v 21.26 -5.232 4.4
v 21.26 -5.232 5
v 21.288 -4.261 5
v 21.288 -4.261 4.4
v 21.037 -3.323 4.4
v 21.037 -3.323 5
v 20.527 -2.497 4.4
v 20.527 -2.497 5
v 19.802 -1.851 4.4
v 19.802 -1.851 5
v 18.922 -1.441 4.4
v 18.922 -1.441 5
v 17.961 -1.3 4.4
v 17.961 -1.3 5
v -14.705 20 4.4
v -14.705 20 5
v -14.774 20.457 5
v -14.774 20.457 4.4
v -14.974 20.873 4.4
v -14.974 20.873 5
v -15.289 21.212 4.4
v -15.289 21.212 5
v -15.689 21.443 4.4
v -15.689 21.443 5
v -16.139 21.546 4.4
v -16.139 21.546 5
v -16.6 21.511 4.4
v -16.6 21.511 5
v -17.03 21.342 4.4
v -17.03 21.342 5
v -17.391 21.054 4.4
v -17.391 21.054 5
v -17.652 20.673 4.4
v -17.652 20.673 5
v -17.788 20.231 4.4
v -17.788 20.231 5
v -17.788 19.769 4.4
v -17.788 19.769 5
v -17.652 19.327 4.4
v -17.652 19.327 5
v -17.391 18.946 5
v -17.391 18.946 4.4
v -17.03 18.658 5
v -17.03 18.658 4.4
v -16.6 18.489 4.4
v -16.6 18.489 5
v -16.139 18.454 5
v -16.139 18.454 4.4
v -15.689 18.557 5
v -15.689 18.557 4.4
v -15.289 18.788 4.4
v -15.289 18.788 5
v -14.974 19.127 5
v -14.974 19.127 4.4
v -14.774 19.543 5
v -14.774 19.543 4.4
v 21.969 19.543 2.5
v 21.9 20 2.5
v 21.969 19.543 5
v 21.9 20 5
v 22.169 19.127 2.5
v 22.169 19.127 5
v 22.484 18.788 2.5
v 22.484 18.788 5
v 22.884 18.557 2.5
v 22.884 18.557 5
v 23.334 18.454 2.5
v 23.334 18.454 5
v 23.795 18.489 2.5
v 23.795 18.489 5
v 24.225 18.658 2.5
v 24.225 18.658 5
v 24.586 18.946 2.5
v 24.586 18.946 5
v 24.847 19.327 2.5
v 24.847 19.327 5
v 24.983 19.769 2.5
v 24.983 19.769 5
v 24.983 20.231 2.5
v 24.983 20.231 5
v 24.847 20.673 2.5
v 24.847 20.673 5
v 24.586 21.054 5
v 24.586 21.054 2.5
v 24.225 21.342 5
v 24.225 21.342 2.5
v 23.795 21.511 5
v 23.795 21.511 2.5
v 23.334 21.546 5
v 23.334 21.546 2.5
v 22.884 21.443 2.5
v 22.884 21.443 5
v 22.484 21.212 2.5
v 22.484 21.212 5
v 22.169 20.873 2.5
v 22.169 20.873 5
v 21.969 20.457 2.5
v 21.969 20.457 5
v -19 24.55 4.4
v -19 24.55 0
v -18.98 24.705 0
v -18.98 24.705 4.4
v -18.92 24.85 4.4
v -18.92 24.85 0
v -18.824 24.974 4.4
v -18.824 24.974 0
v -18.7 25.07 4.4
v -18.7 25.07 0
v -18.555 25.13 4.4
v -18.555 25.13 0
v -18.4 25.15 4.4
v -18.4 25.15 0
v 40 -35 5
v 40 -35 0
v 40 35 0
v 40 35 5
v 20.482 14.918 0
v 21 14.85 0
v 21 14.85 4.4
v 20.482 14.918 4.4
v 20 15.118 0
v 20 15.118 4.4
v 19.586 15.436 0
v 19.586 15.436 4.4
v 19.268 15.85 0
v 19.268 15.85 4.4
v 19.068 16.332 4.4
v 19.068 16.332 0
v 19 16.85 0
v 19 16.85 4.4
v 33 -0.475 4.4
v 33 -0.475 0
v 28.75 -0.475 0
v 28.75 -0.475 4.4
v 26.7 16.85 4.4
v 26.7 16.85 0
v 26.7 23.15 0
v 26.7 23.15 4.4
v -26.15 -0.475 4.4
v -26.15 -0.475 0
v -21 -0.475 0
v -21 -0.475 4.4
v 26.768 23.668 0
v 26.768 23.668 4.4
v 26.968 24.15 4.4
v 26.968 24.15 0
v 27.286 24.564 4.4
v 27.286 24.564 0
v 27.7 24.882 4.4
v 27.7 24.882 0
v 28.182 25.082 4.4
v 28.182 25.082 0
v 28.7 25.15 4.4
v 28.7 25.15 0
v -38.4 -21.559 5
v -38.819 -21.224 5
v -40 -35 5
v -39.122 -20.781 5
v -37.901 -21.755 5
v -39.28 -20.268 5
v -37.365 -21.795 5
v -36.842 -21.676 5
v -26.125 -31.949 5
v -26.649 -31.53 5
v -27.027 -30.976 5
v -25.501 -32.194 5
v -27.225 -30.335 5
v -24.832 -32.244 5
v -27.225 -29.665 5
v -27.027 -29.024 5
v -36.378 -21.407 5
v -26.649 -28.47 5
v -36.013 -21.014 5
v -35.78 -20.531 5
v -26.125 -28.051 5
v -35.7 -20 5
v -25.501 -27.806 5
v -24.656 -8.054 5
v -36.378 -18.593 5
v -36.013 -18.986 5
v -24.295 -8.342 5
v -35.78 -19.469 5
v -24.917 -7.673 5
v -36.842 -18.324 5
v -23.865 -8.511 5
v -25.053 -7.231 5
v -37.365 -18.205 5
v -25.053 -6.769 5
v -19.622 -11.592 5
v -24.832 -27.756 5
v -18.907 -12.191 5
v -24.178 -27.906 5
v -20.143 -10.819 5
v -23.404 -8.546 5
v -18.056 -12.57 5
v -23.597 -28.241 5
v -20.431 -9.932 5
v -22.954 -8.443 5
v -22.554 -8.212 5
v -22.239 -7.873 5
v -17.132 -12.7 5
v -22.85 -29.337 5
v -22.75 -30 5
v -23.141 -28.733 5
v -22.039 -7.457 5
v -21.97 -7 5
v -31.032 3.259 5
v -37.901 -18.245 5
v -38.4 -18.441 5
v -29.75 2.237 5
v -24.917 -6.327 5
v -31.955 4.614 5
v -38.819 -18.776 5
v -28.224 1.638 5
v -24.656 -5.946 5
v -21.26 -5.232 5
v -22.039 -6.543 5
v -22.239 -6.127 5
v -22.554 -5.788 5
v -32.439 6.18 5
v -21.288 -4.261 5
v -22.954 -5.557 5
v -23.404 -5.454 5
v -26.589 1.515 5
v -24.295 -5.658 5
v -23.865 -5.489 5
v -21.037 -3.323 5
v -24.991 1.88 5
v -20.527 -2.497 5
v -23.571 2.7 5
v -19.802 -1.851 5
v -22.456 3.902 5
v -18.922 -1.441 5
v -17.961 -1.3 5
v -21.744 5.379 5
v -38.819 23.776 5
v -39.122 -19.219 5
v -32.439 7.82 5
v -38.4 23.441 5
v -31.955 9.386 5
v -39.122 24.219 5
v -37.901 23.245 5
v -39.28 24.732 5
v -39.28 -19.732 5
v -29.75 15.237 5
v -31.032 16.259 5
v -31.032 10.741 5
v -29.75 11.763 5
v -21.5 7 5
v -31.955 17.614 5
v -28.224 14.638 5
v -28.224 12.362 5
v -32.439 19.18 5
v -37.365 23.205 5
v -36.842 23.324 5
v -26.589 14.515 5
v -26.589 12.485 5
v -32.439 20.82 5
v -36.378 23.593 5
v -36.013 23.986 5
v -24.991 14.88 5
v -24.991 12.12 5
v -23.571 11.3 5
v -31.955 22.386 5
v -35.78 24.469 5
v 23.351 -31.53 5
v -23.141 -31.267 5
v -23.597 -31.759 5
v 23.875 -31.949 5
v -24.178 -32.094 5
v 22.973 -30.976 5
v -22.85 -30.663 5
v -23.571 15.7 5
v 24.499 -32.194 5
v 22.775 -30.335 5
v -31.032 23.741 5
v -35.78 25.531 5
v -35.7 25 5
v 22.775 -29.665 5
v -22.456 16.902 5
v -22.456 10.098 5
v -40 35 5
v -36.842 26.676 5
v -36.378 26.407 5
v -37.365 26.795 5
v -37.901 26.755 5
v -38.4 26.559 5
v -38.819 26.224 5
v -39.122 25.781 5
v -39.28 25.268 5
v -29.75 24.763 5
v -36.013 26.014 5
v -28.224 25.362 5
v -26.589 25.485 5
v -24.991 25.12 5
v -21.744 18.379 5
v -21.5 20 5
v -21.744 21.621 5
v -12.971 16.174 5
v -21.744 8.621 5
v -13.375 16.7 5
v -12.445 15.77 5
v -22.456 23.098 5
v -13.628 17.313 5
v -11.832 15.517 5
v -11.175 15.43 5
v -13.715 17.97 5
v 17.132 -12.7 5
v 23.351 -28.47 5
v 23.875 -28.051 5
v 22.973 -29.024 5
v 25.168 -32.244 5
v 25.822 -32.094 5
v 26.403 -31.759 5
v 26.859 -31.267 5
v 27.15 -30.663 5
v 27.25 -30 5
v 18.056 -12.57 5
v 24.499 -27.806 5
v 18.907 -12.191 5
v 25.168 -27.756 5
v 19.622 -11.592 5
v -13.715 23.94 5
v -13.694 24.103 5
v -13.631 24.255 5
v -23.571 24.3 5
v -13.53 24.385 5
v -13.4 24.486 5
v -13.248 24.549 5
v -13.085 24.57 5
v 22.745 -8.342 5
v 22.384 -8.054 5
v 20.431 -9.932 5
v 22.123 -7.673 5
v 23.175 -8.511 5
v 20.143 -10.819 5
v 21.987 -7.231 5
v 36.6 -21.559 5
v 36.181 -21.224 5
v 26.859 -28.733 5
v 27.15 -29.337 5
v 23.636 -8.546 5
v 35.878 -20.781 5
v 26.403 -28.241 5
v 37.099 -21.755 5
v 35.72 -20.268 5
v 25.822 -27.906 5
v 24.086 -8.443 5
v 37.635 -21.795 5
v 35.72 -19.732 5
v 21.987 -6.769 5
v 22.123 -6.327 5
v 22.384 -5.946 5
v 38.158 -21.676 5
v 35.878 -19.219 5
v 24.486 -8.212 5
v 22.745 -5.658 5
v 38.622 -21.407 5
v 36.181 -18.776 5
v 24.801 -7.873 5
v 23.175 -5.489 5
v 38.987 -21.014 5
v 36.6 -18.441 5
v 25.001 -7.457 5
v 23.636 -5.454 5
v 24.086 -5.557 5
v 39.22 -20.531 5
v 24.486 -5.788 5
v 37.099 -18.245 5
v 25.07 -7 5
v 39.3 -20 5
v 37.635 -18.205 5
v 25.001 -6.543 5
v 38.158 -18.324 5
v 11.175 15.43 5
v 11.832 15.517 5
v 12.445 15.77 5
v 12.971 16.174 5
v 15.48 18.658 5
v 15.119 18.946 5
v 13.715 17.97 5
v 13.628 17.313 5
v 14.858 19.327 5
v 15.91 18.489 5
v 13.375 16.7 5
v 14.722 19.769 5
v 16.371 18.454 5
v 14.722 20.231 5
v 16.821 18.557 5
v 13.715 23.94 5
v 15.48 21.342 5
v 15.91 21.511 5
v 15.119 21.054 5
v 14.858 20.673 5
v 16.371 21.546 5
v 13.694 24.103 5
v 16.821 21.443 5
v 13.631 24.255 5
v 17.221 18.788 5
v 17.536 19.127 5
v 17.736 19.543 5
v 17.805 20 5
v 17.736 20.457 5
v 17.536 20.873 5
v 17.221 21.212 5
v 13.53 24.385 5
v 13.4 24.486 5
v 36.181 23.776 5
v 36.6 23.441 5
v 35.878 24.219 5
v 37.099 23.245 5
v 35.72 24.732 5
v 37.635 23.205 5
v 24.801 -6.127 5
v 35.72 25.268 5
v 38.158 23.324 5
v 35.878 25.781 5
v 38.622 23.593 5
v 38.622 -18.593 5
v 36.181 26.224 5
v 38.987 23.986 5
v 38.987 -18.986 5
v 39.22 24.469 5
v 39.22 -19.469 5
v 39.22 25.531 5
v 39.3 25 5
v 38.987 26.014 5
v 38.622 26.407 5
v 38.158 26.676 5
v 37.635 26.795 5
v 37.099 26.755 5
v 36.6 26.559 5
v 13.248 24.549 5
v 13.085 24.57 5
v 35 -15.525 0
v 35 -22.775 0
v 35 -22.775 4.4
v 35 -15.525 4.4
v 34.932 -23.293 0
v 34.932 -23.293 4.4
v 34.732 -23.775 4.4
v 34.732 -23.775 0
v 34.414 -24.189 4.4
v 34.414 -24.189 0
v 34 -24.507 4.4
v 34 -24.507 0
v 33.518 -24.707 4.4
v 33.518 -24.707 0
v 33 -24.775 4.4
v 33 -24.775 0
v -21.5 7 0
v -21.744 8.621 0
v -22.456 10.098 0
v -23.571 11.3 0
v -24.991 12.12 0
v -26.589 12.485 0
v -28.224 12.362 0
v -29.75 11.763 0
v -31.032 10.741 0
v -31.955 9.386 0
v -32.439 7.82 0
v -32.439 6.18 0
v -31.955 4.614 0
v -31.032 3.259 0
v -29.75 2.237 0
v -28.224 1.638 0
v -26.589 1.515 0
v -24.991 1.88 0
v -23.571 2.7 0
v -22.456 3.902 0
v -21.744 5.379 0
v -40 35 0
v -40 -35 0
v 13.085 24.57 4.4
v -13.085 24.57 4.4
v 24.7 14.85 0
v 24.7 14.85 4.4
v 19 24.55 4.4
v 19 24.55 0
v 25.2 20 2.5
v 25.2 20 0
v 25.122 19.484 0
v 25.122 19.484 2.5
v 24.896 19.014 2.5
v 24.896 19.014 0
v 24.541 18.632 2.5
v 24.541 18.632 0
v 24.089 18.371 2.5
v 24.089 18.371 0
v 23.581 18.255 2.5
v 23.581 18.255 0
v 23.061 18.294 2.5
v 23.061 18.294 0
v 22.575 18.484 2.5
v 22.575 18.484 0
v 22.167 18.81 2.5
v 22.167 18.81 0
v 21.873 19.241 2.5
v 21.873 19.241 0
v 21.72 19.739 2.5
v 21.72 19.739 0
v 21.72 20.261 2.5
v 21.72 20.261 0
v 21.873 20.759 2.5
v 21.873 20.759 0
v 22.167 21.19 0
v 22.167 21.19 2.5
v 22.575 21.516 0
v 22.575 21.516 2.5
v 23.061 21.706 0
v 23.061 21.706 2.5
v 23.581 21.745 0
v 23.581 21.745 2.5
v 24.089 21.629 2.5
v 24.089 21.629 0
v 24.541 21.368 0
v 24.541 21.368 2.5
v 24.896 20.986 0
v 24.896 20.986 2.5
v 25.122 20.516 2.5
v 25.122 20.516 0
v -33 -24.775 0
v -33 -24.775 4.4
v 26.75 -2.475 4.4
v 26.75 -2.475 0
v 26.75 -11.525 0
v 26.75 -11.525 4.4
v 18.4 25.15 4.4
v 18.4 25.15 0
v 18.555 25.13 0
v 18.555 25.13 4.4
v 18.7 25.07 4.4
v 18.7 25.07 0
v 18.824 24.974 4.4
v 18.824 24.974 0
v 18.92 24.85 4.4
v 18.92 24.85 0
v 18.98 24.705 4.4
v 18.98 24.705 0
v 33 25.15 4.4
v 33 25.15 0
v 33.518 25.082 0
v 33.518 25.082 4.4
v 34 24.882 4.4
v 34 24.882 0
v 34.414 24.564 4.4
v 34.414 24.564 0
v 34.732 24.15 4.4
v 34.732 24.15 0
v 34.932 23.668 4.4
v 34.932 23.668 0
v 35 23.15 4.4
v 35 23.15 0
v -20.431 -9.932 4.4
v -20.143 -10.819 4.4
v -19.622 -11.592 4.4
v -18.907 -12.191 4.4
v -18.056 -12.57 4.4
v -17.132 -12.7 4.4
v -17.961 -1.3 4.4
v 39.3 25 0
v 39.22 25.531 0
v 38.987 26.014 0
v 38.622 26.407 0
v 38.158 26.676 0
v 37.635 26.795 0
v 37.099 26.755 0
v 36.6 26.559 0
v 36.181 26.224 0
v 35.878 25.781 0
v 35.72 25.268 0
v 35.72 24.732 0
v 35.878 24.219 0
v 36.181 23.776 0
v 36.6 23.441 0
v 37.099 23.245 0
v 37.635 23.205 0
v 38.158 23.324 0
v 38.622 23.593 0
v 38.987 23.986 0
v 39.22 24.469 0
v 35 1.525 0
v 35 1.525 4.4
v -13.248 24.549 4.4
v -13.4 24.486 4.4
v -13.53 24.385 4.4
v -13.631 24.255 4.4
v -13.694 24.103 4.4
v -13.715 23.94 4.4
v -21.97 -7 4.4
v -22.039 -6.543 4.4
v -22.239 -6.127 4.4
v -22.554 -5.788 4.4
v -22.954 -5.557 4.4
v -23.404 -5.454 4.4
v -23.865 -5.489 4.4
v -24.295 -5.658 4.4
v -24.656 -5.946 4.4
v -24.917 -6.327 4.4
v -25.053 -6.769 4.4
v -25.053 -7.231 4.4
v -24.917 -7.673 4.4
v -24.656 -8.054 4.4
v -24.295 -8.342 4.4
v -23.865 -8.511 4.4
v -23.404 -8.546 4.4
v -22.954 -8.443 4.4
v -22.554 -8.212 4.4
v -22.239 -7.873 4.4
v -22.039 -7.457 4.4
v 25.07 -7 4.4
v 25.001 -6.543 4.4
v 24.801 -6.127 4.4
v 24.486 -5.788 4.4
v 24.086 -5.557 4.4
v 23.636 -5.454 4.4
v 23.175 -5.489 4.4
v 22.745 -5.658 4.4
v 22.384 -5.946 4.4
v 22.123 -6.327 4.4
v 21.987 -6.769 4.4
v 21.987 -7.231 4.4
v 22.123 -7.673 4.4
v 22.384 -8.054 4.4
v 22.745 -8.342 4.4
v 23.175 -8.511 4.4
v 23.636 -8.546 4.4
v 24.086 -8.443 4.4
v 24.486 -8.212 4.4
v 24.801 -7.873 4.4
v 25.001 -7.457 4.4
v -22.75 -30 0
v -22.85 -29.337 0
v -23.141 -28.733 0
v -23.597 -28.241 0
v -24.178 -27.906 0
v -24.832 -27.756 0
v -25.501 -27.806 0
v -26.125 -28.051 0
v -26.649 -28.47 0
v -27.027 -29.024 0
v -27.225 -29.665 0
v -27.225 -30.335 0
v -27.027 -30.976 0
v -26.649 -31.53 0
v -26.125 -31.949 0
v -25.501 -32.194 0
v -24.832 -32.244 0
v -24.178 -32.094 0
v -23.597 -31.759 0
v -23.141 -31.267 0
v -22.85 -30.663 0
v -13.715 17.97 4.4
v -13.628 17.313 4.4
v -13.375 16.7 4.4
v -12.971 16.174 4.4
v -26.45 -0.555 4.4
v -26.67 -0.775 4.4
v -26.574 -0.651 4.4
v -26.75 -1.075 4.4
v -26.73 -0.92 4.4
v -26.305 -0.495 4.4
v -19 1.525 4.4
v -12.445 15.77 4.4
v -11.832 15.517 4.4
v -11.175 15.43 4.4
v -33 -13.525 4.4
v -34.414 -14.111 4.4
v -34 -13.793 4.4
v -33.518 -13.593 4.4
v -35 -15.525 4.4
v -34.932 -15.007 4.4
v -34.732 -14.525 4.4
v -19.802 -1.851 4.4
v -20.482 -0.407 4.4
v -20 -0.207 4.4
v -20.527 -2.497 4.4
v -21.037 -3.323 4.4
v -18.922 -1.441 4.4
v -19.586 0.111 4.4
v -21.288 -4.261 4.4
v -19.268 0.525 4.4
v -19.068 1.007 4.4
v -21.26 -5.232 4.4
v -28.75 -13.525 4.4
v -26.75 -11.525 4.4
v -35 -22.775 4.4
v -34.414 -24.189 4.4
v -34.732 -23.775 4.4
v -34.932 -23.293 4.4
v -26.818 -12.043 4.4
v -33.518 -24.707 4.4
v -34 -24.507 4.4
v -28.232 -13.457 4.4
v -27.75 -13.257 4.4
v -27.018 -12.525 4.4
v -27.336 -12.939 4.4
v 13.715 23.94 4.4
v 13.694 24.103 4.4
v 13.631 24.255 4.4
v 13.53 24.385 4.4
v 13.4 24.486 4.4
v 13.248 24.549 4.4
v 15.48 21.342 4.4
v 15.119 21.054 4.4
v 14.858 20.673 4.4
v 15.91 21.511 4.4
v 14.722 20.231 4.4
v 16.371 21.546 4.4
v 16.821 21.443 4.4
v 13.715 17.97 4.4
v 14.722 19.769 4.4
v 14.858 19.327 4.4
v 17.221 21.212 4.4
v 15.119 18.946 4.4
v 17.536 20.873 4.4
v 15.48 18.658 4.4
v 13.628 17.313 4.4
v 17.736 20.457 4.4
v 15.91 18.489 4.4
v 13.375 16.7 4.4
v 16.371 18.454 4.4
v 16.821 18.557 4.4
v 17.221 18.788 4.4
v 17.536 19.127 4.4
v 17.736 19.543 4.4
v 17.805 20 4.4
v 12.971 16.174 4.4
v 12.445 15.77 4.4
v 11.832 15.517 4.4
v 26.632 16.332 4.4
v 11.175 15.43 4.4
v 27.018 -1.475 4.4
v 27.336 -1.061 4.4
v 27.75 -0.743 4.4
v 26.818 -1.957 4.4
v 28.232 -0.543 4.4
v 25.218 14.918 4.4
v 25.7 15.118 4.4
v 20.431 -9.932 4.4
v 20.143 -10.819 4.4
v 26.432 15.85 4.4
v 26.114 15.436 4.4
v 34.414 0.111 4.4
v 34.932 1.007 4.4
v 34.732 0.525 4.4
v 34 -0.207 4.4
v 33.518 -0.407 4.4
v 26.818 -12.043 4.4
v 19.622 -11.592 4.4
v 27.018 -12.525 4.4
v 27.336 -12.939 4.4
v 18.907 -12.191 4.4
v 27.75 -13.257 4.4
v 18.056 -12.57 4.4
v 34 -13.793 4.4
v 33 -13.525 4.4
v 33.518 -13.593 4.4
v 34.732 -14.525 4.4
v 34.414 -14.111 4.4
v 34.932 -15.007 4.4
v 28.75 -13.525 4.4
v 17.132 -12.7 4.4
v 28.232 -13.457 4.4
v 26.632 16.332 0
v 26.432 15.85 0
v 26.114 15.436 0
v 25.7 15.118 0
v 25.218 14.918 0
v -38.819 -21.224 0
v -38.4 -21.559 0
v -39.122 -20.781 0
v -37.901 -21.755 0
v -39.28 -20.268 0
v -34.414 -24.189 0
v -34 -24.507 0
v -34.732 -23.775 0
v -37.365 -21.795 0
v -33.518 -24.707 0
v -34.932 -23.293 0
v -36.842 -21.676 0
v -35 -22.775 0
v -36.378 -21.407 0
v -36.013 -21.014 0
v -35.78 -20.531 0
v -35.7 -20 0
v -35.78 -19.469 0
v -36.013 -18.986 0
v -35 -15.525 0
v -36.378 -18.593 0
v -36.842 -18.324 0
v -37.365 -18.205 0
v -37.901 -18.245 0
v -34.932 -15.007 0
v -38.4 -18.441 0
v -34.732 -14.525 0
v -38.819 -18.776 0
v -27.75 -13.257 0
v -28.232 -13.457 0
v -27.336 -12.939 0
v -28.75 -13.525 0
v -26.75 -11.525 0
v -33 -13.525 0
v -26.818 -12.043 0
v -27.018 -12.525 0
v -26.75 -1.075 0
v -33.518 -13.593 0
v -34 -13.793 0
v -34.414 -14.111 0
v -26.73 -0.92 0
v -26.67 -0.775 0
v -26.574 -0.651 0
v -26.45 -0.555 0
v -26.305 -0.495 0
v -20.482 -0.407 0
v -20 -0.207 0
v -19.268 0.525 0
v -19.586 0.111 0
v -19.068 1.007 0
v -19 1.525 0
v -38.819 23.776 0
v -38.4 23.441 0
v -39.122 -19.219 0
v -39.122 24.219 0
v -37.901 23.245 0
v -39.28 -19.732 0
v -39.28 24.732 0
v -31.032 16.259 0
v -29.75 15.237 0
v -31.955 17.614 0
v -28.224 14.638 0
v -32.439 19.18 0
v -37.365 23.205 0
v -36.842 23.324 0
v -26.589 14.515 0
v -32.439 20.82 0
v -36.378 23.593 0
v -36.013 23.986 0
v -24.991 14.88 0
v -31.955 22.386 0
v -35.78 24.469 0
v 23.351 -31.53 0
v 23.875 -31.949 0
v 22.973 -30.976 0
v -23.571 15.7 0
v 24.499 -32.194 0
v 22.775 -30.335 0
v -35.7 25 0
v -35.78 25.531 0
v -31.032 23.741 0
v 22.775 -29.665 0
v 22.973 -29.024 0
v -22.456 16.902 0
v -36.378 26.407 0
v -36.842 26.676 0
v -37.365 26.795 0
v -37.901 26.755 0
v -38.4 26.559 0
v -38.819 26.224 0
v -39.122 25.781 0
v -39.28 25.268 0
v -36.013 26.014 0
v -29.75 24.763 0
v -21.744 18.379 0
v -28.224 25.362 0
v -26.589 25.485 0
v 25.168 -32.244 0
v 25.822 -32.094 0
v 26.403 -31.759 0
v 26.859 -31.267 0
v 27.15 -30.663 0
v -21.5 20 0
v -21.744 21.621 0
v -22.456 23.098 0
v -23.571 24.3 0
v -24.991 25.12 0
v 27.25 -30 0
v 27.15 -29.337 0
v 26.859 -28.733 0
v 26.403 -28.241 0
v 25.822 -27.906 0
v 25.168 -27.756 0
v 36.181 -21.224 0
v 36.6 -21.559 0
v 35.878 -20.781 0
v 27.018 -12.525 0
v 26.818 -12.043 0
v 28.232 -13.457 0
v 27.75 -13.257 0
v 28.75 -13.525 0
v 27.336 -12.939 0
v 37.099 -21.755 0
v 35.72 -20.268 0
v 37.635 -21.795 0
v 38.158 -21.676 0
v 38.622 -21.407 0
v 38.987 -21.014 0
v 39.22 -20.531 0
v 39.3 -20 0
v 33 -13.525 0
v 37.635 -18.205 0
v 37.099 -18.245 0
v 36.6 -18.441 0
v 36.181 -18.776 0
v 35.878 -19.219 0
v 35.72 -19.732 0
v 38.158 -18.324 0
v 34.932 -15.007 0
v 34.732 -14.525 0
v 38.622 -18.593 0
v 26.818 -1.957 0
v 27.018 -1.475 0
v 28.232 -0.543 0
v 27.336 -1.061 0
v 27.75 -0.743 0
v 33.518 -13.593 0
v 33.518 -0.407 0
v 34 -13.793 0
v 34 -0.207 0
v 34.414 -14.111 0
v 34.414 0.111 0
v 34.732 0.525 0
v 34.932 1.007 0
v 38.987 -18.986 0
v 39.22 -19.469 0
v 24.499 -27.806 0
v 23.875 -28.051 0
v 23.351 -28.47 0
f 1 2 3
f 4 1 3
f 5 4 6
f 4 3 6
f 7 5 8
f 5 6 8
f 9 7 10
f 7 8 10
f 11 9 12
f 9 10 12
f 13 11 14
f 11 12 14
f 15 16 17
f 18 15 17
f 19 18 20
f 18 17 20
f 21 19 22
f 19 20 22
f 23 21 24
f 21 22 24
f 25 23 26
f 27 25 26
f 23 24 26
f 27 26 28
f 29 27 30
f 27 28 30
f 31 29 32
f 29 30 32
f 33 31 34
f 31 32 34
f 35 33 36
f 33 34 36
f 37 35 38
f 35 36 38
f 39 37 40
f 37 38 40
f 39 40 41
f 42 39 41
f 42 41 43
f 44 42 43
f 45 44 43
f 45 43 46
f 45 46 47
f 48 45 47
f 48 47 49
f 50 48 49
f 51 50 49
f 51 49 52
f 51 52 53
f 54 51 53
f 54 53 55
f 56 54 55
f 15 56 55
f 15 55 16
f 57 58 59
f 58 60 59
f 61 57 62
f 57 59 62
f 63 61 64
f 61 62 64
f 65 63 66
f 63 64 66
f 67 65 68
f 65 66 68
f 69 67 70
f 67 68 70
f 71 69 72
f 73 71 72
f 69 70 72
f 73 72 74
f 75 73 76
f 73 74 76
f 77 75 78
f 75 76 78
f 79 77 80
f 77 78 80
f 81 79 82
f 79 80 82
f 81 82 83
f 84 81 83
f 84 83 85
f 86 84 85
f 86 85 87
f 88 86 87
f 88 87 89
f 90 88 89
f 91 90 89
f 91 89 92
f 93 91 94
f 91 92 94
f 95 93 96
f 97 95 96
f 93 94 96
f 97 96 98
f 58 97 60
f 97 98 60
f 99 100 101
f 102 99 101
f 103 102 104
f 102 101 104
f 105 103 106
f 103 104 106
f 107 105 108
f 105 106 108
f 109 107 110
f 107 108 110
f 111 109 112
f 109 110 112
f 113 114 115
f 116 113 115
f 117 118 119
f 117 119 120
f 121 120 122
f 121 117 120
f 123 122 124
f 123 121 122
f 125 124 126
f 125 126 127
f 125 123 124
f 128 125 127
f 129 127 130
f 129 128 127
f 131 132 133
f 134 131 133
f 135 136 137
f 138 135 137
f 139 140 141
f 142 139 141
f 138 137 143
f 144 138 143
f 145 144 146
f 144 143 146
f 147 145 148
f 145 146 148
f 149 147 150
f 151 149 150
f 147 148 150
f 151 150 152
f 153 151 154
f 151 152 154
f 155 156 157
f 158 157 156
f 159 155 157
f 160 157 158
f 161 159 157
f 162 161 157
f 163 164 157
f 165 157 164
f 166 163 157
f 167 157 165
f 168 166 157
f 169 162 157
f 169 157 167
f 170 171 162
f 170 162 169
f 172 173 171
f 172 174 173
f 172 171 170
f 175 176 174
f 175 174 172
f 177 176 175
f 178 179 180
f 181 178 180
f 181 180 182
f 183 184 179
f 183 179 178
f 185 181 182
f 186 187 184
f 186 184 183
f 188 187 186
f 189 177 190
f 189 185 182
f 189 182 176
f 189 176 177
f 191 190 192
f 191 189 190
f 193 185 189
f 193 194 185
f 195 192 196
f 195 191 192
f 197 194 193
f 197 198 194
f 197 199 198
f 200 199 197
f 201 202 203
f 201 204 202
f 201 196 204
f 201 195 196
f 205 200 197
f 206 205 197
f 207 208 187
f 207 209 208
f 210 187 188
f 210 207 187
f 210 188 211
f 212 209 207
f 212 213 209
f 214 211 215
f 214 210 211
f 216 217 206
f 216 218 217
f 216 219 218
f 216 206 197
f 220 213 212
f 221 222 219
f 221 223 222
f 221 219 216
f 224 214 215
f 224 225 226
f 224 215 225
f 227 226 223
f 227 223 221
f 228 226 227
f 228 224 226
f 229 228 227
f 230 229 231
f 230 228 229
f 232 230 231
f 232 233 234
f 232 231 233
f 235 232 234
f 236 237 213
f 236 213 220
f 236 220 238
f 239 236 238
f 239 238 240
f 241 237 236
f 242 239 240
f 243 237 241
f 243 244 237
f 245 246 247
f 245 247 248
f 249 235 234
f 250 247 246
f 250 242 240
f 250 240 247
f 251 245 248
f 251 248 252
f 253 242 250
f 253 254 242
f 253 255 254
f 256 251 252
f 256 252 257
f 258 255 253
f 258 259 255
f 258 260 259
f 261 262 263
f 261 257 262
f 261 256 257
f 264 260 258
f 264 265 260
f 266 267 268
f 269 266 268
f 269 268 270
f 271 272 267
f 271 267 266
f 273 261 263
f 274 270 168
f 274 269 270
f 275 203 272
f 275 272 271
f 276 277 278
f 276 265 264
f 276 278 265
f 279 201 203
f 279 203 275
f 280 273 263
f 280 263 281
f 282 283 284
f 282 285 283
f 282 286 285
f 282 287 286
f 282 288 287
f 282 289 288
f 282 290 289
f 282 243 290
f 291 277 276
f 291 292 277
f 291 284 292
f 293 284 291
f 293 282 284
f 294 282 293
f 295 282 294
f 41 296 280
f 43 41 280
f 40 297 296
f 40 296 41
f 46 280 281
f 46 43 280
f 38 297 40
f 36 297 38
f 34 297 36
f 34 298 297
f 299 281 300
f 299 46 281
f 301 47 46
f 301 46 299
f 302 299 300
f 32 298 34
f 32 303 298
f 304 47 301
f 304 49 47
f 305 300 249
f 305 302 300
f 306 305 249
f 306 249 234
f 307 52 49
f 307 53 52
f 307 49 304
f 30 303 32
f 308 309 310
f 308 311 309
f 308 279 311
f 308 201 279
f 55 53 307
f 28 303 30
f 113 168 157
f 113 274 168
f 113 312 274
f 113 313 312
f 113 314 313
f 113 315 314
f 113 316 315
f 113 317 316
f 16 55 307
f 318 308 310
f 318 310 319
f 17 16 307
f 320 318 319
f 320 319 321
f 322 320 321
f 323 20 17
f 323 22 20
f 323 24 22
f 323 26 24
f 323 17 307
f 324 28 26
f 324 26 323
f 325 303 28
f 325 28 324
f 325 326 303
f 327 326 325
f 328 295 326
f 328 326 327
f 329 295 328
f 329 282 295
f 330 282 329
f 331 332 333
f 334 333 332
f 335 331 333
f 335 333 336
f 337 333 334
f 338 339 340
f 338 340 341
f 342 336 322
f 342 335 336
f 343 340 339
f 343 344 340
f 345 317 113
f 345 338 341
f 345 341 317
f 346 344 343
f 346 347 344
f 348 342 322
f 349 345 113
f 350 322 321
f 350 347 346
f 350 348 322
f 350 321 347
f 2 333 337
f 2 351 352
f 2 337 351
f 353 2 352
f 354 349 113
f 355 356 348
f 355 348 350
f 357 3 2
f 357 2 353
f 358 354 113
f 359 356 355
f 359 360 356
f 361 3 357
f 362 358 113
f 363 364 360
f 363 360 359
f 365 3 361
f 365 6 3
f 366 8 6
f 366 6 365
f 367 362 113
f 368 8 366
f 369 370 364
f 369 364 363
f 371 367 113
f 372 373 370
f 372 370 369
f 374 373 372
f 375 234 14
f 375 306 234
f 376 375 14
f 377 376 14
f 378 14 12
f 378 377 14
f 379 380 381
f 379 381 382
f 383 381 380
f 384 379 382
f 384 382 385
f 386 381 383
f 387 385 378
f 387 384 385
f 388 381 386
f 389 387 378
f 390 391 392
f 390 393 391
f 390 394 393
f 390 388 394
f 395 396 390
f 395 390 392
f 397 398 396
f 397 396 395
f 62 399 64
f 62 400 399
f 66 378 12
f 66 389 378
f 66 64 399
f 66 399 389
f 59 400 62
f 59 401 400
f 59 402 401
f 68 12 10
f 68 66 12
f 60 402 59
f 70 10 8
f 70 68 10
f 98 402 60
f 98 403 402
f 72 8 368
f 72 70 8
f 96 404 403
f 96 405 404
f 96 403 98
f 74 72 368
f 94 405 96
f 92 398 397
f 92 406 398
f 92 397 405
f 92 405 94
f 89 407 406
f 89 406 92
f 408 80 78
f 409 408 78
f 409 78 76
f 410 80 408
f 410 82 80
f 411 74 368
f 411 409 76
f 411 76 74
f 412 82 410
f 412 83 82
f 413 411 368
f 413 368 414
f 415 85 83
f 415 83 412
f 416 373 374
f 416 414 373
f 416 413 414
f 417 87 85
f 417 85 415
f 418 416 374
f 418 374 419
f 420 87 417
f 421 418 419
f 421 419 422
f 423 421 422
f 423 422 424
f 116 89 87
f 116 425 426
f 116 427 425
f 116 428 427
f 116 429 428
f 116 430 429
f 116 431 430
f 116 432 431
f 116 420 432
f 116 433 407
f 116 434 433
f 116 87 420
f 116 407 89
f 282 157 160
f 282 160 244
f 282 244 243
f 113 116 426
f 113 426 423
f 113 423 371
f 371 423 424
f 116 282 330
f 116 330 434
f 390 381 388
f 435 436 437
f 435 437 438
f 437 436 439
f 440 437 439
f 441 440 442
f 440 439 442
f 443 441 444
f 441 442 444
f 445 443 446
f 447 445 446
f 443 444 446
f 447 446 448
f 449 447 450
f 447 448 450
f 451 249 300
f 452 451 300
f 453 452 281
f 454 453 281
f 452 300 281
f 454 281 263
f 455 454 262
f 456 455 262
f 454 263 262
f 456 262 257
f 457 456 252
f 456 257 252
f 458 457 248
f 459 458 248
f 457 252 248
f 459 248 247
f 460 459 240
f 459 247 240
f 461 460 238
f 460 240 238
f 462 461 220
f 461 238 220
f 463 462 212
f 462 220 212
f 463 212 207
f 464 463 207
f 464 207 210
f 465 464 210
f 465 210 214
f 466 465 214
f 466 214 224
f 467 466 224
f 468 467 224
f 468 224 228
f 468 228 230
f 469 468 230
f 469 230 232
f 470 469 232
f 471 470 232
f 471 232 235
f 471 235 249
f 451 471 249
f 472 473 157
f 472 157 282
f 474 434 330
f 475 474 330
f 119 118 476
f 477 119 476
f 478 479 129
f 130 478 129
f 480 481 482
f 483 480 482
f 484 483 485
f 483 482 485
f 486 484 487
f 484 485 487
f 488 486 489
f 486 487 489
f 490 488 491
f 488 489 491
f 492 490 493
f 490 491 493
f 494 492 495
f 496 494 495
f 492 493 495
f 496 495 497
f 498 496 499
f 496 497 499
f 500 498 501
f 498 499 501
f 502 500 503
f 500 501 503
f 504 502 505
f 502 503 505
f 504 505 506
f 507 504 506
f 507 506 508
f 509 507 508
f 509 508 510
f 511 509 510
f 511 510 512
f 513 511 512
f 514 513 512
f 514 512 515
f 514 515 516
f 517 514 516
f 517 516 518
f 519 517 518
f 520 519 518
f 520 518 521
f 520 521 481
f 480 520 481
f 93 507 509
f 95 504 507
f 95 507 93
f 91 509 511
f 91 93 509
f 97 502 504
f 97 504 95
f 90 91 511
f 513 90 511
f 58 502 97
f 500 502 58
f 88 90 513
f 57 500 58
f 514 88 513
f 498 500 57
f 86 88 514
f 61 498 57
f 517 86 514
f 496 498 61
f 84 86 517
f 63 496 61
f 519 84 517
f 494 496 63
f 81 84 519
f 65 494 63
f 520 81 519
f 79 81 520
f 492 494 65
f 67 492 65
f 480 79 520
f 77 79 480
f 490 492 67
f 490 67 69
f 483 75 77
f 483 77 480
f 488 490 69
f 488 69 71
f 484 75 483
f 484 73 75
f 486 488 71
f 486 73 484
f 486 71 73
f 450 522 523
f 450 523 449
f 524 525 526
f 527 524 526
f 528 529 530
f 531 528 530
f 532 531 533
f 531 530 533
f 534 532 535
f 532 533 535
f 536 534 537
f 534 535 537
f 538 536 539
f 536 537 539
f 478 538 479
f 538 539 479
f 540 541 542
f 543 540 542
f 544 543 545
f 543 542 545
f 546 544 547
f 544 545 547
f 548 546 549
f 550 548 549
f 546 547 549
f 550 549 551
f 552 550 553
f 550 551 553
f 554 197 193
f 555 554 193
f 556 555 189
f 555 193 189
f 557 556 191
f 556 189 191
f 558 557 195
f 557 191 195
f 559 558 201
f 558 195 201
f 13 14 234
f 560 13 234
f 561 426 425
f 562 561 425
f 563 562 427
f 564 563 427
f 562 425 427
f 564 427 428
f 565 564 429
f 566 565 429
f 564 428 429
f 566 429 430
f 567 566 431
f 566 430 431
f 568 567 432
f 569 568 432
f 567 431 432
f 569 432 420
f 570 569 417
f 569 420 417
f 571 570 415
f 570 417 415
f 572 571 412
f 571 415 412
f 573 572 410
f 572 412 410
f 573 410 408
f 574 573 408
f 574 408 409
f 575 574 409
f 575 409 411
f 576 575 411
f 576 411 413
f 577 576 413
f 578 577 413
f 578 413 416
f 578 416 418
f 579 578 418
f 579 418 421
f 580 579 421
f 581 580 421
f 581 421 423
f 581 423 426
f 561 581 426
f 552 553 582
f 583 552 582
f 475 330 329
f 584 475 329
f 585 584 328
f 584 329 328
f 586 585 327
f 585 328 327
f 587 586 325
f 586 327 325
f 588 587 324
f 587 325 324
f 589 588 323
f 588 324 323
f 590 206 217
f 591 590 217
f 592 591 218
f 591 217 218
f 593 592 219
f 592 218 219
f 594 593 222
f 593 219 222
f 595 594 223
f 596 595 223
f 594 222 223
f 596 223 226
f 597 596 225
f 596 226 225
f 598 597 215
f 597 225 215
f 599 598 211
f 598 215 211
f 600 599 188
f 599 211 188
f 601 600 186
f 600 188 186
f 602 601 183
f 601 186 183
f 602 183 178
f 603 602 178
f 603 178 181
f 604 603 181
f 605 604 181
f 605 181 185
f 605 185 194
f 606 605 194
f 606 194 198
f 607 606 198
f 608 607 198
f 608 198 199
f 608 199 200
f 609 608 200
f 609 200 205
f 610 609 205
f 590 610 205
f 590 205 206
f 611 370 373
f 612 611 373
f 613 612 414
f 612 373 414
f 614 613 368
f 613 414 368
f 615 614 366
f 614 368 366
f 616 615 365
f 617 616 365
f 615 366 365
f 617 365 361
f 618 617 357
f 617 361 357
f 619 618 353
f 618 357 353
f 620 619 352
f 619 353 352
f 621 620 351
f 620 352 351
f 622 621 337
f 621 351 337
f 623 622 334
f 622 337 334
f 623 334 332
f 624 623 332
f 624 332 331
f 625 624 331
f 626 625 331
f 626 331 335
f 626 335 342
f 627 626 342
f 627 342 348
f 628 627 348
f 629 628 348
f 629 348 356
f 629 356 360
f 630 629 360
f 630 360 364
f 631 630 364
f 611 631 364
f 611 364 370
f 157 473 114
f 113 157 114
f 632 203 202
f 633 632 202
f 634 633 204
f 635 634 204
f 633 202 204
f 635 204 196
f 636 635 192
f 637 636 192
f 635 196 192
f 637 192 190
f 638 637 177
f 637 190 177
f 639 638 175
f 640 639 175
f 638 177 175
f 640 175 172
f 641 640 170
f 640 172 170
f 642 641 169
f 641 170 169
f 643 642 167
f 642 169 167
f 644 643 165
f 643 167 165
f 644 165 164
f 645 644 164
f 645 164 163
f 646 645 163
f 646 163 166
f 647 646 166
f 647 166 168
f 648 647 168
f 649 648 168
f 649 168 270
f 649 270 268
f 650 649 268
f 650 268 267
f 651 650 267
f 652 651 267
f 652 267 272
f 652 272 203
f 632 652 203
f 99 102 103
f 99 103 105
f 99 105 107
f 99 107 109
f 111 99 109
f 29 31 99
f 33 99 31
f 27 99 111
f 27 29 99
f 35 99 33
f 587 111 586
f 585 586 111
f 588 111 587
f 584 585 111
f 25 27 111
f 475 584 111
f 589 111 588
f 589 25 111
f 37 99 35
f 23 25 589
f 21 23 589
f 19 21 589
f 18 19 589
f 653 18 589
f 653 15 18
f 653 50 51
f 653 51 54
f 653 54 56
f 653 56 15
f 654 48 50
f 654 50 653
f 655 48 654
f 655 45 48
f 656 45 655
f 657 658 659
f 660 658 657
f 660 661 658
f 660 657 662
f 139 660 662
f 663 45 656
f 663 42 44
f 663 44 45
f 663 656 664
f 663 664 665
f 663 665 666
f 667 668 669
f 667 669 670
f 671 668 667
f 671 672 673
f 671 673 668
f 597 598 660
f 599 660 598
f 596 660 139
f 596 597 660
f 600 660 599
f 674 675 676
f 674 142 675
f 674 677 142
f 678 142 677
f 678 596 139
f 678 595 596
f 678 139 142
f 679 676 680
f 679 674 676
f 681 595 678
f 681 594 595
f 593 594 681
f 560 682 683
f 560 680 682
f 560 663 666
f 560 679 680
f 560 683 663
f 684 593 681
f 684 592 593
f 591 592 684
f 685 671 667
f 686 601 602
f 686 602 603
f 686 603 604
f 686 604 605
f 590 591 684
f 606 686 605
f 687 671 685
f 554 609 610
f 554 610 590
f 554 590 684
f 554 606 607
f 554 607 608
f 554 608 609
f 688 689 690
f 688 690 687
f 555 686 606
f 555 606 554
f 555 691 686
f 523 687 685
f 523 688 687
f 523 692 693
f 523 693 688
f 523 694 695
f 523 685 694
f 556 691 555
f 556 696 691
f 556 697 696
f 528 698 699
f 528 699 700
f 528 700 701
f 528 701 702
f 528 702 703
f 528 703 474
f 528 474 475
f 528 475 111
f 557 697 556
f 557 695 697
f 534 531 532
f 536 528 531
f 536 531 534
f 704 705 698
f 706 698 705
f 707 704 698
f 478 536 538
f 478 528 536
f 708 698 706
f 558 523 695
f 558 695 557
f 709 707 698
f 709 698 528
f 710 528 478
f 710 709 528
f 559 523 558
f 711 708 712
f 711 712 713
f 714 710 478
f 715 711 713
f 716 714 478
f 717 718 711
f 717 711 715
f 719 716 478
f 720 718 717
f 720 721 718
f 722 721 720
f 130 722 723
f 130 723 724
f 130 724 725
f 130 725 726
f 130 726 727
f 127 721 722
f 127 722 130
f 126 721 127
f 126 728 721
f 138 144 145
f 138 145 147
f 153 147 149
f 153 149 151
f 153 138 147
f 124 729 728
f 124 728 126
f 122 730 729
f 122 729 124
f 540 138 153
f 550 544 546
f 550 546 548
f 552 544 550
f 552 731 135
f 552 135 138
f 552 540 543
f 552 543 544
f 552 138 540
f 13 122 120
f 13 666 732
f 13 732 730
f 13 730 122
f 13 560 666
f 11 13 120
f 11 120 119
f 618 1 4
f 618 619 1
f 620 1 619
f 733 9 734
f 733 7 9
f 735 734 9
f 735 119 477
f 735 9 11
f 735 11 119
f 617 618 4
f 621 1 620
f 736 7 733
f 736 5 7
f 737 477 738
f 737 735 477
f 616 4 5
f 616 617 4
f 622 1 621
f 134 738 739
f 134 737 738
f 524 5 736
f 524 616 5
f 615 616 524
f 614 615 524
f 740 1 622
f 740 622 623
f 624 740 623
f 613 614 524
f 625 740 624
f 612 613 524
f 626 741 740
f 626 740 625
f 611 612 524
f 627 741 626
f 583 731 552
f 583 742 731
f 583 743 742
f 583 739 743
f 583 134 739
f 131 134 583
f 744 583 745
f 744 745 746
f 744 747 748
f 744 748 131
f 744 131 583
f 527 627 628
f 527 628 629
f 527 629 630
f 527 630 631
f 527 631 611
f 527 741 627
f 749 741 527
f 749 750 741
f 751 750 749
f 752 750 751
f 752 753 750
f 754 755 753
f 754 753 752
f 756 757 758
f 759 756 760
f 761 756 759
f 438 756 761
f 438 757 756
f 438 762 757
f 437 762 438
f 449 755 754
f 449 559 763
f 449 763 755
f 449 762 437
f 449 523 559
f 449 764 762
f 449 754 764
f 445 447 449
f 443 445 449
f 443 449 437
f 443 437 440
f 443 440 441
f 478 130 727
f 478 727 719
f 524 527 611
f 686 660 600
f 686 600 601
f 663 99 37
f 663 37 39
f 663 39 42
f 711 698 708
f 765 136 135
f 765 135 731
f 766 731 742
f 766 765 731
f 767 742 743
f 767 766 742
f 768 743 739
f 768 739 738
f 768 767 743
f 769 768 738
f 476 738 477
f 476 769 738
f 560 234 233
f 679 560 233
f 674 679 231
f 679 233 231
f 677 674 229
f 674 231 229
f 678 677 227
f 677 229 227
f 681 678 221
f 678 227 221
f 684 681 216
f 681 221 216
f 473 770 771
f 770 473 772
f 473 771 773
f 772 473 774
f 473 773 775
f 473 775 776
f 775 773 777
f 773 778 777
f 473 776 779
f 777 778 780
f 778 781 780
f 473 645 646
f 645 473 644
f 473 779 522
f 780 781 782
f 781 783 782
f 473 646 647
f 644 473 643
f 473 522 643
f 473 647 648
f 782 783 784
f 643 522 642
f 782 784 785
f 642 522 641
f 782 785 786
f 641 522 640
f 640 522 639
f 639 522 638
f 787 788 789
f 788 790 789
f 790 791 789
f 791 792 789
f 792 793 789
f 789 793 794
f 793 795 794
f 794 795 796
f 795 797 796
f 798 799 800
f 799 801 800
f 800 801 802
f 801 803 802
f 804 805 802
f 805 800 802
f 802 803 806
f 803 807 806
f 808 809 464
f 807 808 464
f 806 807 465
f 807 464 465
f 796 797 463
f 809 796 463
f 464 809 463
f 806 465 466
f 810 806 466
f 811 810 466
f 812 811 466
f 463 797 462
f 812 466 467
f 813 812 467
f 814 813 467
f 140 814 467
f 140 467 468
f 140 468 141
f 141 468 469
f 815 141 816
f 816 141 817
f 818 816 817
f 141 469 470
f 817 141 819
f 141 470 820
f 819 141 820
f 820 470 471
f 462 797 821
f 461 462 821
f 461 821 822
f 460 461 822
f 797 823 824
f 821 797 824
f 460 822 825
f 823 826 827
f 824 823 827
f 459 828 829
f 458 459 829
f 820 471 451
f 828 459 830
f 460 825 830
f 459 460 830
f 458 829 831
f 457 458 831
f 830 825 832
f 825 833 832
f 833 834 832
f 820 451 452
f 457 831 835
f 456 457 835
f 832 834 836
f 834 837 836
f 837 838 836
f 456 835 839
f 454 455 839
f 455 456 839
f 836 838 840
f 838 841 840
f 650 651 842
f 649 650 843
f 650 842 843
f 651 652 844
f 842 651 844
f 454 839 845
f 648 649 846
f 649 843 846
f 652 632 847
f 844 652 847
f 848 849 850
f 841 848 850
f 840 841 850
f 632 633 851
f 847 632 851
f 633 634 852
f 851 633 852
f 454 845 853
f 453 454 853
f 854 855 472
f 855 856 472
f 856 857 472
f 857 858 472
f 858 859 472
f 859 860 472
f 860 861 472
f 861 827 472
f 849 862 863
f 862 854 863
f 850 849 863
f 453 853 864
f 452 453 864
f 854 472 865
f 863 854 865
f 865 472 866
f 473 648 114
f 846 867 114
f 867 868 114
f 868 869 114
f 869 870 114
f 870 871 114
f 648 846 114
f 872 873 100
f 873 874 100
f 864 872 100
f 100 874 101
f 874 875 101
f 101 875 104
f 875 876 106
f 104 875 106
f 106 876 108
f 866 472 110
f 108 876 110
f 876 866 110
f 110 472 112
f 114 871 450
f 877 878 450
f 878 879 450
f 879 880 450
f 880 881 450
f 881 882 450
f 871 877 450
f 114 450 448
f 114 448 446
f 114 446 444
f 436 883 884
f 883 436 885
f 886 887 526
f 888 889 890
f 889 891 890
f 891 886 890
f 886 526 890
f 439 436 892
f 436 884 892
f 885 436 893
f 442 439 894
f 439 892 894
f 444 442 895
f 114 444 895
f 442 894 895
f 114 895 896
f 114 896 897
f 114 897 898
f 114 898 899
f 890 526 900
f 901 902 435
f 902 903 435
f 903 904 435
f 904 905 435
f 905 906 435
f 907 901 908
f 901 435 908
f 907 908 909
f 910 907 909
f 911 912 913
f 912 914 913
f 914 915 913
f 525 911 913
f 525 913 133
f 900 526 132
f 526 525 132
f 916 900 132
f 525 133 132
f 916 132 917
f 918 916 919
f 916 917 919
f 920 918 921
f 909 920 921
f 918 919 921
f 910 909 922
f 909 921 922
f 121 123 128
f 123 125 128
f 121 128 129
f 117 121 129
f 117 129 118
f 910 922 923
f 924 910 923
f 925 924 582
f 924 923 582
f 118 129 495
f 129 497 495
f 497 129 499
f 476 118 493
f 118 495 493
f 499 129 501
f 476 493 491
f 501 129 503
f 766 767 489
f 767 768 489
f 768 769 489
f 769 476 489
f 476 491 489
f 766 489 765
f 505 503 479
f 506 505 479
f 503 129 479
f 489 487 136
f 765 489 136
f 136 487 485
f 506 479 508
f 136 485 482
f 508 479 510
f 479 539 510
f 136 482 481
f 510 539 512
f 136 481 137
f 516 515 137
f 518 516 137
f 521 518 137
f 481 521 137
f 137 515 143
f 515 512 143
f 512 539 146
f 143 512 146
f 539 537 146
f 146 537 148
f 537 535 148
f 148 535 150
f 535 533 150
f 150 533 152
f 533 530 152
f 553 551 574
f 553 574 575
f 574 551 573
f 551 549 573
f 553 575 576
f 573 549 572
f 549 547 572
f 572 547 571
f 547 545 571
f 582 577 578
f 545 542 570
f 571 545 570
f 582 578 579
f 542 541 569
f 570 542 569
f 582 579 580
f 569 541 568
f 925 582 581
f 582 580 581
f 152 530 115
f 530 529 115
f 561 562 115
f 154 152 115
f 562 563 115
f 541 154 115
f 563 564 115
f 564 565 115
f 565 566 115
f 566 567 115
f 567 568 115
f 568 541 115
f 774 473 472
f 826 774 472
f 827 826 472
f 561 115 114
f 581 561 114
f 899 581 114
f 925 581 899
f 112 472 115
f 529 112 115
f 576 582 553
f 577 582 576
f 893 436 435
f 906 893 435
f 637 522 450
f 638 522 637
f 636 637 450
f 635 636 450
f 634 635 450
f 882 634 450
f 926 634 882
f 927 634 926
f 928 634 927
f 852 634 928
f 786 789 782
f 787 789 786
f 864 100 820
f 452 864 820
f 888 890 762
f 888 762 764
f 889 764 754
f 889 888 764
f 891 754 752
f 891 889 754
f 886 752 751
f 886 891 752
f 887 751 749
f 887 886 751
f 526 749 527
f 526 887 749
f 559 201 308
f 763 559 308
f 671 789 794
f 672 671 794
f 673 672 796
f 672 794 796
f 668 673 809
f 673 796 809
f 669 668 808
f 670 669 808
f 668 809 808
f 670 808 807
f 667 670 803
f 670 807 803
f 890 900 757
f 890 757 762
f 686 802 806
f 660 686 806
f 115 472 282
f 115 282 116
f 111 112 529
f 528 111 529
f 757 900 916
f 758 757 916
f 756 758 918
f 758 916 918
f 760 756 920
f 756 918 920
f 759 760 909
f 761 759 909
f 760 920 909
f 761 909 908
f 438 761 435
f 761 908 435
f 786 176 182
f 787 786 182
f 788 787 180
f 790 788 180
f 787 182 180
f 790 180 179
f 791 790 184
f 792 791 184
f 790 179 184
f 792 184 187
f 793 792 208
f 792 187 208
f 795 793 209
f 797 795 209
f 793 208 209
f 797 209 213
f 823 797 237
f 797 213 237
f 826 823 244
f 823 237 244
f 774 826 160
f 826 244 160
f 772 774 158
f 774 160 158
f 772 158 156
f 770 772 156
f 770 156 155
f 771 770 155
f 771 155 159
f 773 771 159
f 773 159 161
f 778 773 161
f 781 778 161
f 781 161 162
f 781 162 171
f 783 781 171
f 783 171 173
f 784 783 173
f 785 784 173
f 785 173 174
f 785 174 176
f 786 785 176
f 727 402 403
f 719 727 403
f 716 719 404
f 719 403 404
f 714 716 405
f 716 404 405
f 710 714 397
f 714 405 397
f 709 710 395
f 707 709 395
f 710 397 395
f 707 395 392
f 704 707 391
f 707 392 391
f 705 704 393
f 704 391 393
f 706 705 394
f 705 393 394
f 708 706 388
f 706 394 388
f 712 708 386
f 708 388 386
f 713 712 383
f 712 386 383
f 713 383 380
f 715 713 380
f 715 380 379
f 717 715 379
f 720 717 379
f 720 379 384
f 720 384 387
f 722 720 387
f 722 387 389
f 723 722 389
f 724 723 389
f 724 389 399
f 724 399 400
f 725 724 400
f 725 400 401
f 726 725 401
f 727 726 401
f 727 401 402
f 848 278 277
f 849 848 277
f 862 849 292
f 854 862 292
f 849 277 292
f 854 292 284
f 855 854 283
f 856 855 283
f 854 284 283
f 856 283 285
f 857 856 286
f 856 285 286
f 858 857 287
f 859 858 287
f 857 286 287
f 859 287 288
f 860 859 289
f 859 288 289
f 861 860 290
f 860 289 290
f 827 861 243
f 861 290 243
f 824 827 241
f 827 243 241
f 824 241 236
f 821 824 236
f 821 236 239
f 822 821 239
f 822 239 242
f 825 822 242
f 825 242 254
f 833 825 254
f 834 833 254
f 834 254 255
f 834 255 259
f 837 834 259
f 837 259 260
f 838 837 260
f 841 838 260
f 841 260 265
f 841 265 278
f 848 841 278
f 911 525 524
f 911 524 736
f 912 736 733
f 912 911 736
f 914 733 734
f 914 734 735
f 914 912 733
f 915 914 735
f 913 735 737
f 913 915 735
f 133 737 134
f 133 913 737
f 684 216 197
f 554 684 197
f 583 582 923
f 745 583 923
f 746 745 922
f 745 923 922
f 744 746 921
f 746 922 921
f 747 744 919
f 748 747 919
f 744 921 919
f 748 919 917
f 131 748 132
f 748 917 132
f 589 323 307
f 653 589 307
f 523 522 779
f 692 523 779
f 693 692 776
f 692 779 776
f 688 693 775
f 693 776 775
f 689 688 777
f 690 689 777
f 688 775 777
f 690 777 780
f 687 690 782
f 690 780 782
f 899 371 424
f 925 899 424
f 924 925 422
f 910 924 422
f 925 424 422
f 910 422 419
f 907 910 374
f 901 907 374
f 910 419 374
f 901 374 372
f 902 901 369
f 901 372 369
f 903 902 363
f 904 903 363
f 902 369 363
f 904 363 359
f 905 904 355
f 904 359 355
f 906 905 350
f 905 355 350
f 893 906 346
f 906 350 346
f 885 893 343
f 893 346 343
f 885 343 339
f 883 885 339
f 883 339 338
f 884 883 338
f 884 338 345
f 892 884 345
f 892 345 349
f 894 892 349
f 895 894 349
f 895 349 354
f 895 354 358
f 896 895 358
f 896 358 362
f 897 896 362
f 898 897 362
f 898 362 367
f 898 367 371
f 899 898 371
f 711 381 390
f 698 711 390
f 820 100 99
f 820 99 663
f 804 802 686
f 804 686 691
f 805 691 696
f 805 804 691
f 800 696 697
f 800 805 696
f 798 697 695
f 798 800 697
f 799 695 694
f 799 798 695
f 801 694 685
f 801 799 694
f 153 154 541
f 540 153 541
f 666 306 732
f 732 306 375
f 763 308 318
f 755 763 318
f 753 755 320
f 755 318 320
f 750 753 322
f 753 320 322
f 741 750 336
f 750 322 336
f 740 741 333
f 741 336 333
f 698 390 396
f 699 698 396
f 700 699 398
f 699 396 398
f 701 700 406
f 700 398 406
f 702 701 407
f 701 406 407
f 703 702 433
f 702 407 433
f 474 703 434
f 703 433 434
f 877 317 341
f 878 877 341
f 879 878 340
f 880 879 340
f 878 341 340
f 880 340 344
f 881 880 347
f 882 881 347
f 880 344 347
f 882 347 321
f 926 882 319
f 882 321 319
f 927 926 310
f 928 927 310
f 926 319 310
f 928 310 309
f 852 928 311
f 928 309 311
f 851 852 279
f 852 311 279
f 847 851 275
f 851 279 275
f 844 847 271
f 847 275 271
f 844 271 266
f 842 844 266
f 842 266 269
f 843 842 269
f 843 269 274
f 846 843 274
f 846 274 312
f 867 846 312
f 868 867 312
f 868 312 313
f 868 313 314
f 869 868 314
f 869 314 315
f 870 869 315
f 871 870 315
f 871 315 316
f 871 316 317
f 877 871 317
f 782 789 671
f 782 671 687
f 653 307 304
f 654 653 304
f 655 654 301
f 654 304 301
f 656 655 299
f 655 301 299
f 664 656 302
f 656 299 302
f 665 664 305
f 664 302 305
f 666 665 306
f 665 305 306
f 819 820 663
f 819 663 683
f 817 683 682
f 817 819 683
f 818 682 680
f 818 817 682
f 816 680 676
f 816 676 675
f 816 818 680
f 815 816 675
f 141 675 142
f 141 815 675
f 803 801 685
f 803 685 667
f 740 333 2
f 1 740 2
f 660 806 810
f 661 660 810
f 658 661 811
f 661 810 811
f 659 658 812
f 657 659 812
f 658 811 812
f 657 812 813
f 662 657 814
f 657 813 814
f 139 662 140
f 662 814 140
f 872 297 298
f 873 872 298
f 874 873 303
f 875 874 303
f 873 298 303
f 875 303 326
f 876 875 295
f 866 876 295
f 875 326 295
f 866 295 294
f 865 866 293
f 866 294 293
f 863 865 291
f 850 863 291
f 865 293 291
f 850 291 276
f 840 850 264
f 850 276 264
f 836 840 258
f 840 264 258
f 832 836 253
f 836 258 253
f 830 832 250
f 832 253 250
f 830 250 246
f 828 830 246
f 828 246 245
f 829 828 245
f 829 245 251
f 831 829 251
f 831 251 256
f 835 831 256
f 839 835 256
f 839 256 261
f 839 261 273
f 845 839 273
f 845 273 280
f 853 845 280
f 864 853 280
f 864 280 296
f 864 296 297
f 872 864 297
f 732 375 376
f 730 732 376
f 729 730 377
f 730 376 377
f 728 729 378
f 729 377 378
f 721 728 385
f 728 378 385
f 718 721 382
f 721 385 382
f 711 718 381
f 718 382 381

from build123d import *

# Parameters (mm, degrees)
SKETCH_W            = 80
SKETCH_H            = 70
PAD_DEPTH           = 5
SKETCH001_R         = 1.8
HOLE_DEPTH          = 5.001
SKETCH005_R         = 2.25
HOLE003_DEPTH       = 5.001
SKETCH003_R         = 1.55
HOLE001_DEPTH       = 5.001
SKETCH002_R         = 5.5
HOLE002_DEPTH       = 25
POCKET_DEPTH        = 5.001
HOLE004_D           = 3.1
HOLE004_CBORE_D     = 3.5
HOLE004_CBORE_DEPTH = 2.5
POCKET001_DEPTH     = 4.4


with BuildPart() as part:
    # Sketch → Pad (new body)
    with BuildSketch(Plane.XY):
        Rectangle(SKETCH_W, SKETCH_H)
    extrude(amount=PAD_DEPTH)

    # Sketch001 (on Face6 of Pad) → Hole (cut, through all)
    with BuildSketch(Plane.XY.offset(5)):
        with Locations((-37.5, 25)):
            Circle(SKETCH001_R)
        with Locations((37.5, 25)):
            Circle(SKETCH001_R)
        with Locations((-37.5, -20)):
            Circle(SKETCH001_R)
        with Locations((37.5, -20)):
            Circle(SKETCH001_R)
    extrude(amount=-HOLE_DEPTH, mode=Mode.SUBTRACT)

    # Sketch005 (on Face5 of Hole) → Hole003 (cut, through all)
    with BuildSketch(Plane.XY.offset(5)):
        with Locations((-25, -30)):
            Circle(SKETCH005_R)
        with Locations((25, -30)):
            Circle(SKETCH005_R)
    extrude(amount=-HOLE003_DEPTH, mode=Mode.SUBTRACT)

    # Sketch003 (on Face5 of Hole003) → Hole001 (cut, through all)
    with BuildSketch(Plane.XY.offset(5)):
        with Locations((-16.255, 20)):
            Circle(SKETCH003_R)
        with Locations((16.255, 20)):
            Circle(SKETCH003_R)
        with Locations((-23.52, -7)):
            Circle(SKETCH003_R)
        with Locations((23.52, -7)):
            Circle(SKETCH003_R)
    extrude(amount=-HOLE001_DEPTH, mode=Mode.SUBTRACT)

    # Sketch002 (on Face5 of Hole001) → Hole002 (cut)
    with BuildSketch(Plane.XY.offset(5)):
        with Locations((-27, 7)):
            Circle(SKETCH002_R)
        with Locations((-27, 20)):
            Circle(SKETCH002_R)
    extrude(amount=-HOLE002_DEPTH, mode=Mode.SUBTRACT)

    # Sketch004 (on Face5 of Hole002) → Pocket (cut, through all)
    with BuildSketch(Plane.XY.offset(5)):
        with BuildLine():
            Line((-13.715, 23.94), (-13.715, 17.97))
            ThreePointArc((-13.715, 17.97), (-12.971051, 16.173949), (-11.175, 15.43))
            Line((-11.175, 15.43), (11.175, 15.43))
            ThreePointArc((11.175, 15.43), (12.971051, 16.173949), (13.715, 17.97))
            Line((13.715, 17.97), (13.715, 23.94))
            ThreePointArc((13.715, 23.94), (13.530477, 24.385477), (13.085, 24.57))
            Line((13.085, 24.57), (-13.085, 24.57))
            ThreePointArc((-13.085, 24.57), (-13.530477, 24.385477), (-13.715, 23.94))
        make_face()
        with BuildLine():
            Line((-21.26, -5.231721), (-20.431263, -9.931721))
            ThreePointArc((-20.431263, -9.931721), (-19.285496, -11.916249), (-17.132157, -12.7))
            Line((-17.132157, -12.7), (17.132157, -12.7))
            ThreePointArc((17.132157, -12.7), (19.285496, -11.916249), (20.431263, -9.931721))
            Line((20.431263, -9.931721), (21.26, -5.231721))
            ThreePointArc((21.26, -5.231721), (20.527143, -2.496662), (17.960894, -1.3))
            Line((17.960894, -1.3), (-17.960894, -1.3))
            ThreePointArc((-17.960894, -1.3), (-20.527143, -2.496662), (-21.26, -5.231721))
        make_face()
    extrude(amount=-POCKET_DEPTH, mode=Mode.SUBTRACT)

    # Hole004 (through all)
    with Locations(Plane(origin=(0, 0, 0), x_dir=(1, 0, 0), z_dir=(0, 0, -1))):
        with Locations((23.45, -20)):
            CounterBoreHole(HOLE004_D / 2, HOLE004_CBORE_D / 2, HOLE004_CBORE_DEPTH)

    # Sketch007 (on Face4 of Hole004) → Pocket001 (cut)
    with BuildSketch(Plane(origin=(0, 0, 0), x_dir=(1, 0, 0), z_dir=(0, 0, -1))):
        with BuildLine():
            Line((-18.4, -25.15), (18.4, -25.15))
            ThreePointArc((18.4, -25.15), (18.824264, -24.974264), (19, -24.55))
            Line((19, -24.55), (19, -16.85))
            ThreePointArc((21, -14.85), (19.585786, -15.435786), (19, -16.85))
            Line((21, -14.85), (24.7, -14.85))
            ThreePointArc((26.7, -16.85), (26.114214, -15.435786), (24.7, -14.85))
            Line((26.7, -16.85), (26.7, -23.15))
            ThreePointArc((26.7, -23.15), (27.285786, -24.564214), (28.7, -25.15))
            Line((28.7, -25.15), (33, -25.15))
            ThreePointArc((33, -25.15), (34.414214, -24.564214), (35, -23.15))
            Line((35, -23.15), (35, -1.525))
            ThreePointArc((35, -1.525), (34.414214, -0.110786), (33, 0.475))
            Line((33, 0.475), (28.75, 0.475))
            ThreePointArc((26.75, 2.475), (27.335786, 1.060786), (28.75, 0.475))
            Line((26.75, 2.475), (26.75, 11.525))
            ThreePointArc((28.75, 13.525), (27.335786, 12.939214), (26.75, 11.525))
            Line((33, 13.525), (28.75, 13.525))
            ThreePointArc((33, 13.525), (34.414214, 14.110786), (35, 15.525))
            Line((35, 22.775), (35, 15.525))
            ThreePointArc((35, 22.775), (34.414214, 24.189214), (33, 24.775))
            Line((-33, 24.775), (33, 24.775))
            ThreePointArc((-33, 24.775), (-34.414214, 24.189214), (-35, 22.775))
            Line((-35, 15.525), (-35, 22.775))
            ThreePointArc((-35, 15.525), (-34.414214, 14.110786), (-33, 13.525))
            Line((-28.75, 13.525), (-33, 13.525))
            ThreePointArc((-26.75, 11.525), (-27.335786, 12.939214), (-28.75, 13.525))
            Line((-26.75, 11.525), (-26.75, 1.075))
            ThreePointArc((-26.75, 1.075), (-26.574264, 0.650736), (-26.15, 0.475))
            Line((-26.15, 0.475), (-21, 0.475))
            ThreePointArc((-19, -1.525), (-19.585786, -0.110786), (-21, 0.475))
            Line((-19, -24.55), (-19, -1.525))
            ThreePointArc((-19, -24.55), (-18.824264, -24.974264), (-18.4, -25.15))
        make_face()
    extrude(amount=-POCKET001_DEPTH, mode=Mode.SUBTRACT)


solid = part.part
